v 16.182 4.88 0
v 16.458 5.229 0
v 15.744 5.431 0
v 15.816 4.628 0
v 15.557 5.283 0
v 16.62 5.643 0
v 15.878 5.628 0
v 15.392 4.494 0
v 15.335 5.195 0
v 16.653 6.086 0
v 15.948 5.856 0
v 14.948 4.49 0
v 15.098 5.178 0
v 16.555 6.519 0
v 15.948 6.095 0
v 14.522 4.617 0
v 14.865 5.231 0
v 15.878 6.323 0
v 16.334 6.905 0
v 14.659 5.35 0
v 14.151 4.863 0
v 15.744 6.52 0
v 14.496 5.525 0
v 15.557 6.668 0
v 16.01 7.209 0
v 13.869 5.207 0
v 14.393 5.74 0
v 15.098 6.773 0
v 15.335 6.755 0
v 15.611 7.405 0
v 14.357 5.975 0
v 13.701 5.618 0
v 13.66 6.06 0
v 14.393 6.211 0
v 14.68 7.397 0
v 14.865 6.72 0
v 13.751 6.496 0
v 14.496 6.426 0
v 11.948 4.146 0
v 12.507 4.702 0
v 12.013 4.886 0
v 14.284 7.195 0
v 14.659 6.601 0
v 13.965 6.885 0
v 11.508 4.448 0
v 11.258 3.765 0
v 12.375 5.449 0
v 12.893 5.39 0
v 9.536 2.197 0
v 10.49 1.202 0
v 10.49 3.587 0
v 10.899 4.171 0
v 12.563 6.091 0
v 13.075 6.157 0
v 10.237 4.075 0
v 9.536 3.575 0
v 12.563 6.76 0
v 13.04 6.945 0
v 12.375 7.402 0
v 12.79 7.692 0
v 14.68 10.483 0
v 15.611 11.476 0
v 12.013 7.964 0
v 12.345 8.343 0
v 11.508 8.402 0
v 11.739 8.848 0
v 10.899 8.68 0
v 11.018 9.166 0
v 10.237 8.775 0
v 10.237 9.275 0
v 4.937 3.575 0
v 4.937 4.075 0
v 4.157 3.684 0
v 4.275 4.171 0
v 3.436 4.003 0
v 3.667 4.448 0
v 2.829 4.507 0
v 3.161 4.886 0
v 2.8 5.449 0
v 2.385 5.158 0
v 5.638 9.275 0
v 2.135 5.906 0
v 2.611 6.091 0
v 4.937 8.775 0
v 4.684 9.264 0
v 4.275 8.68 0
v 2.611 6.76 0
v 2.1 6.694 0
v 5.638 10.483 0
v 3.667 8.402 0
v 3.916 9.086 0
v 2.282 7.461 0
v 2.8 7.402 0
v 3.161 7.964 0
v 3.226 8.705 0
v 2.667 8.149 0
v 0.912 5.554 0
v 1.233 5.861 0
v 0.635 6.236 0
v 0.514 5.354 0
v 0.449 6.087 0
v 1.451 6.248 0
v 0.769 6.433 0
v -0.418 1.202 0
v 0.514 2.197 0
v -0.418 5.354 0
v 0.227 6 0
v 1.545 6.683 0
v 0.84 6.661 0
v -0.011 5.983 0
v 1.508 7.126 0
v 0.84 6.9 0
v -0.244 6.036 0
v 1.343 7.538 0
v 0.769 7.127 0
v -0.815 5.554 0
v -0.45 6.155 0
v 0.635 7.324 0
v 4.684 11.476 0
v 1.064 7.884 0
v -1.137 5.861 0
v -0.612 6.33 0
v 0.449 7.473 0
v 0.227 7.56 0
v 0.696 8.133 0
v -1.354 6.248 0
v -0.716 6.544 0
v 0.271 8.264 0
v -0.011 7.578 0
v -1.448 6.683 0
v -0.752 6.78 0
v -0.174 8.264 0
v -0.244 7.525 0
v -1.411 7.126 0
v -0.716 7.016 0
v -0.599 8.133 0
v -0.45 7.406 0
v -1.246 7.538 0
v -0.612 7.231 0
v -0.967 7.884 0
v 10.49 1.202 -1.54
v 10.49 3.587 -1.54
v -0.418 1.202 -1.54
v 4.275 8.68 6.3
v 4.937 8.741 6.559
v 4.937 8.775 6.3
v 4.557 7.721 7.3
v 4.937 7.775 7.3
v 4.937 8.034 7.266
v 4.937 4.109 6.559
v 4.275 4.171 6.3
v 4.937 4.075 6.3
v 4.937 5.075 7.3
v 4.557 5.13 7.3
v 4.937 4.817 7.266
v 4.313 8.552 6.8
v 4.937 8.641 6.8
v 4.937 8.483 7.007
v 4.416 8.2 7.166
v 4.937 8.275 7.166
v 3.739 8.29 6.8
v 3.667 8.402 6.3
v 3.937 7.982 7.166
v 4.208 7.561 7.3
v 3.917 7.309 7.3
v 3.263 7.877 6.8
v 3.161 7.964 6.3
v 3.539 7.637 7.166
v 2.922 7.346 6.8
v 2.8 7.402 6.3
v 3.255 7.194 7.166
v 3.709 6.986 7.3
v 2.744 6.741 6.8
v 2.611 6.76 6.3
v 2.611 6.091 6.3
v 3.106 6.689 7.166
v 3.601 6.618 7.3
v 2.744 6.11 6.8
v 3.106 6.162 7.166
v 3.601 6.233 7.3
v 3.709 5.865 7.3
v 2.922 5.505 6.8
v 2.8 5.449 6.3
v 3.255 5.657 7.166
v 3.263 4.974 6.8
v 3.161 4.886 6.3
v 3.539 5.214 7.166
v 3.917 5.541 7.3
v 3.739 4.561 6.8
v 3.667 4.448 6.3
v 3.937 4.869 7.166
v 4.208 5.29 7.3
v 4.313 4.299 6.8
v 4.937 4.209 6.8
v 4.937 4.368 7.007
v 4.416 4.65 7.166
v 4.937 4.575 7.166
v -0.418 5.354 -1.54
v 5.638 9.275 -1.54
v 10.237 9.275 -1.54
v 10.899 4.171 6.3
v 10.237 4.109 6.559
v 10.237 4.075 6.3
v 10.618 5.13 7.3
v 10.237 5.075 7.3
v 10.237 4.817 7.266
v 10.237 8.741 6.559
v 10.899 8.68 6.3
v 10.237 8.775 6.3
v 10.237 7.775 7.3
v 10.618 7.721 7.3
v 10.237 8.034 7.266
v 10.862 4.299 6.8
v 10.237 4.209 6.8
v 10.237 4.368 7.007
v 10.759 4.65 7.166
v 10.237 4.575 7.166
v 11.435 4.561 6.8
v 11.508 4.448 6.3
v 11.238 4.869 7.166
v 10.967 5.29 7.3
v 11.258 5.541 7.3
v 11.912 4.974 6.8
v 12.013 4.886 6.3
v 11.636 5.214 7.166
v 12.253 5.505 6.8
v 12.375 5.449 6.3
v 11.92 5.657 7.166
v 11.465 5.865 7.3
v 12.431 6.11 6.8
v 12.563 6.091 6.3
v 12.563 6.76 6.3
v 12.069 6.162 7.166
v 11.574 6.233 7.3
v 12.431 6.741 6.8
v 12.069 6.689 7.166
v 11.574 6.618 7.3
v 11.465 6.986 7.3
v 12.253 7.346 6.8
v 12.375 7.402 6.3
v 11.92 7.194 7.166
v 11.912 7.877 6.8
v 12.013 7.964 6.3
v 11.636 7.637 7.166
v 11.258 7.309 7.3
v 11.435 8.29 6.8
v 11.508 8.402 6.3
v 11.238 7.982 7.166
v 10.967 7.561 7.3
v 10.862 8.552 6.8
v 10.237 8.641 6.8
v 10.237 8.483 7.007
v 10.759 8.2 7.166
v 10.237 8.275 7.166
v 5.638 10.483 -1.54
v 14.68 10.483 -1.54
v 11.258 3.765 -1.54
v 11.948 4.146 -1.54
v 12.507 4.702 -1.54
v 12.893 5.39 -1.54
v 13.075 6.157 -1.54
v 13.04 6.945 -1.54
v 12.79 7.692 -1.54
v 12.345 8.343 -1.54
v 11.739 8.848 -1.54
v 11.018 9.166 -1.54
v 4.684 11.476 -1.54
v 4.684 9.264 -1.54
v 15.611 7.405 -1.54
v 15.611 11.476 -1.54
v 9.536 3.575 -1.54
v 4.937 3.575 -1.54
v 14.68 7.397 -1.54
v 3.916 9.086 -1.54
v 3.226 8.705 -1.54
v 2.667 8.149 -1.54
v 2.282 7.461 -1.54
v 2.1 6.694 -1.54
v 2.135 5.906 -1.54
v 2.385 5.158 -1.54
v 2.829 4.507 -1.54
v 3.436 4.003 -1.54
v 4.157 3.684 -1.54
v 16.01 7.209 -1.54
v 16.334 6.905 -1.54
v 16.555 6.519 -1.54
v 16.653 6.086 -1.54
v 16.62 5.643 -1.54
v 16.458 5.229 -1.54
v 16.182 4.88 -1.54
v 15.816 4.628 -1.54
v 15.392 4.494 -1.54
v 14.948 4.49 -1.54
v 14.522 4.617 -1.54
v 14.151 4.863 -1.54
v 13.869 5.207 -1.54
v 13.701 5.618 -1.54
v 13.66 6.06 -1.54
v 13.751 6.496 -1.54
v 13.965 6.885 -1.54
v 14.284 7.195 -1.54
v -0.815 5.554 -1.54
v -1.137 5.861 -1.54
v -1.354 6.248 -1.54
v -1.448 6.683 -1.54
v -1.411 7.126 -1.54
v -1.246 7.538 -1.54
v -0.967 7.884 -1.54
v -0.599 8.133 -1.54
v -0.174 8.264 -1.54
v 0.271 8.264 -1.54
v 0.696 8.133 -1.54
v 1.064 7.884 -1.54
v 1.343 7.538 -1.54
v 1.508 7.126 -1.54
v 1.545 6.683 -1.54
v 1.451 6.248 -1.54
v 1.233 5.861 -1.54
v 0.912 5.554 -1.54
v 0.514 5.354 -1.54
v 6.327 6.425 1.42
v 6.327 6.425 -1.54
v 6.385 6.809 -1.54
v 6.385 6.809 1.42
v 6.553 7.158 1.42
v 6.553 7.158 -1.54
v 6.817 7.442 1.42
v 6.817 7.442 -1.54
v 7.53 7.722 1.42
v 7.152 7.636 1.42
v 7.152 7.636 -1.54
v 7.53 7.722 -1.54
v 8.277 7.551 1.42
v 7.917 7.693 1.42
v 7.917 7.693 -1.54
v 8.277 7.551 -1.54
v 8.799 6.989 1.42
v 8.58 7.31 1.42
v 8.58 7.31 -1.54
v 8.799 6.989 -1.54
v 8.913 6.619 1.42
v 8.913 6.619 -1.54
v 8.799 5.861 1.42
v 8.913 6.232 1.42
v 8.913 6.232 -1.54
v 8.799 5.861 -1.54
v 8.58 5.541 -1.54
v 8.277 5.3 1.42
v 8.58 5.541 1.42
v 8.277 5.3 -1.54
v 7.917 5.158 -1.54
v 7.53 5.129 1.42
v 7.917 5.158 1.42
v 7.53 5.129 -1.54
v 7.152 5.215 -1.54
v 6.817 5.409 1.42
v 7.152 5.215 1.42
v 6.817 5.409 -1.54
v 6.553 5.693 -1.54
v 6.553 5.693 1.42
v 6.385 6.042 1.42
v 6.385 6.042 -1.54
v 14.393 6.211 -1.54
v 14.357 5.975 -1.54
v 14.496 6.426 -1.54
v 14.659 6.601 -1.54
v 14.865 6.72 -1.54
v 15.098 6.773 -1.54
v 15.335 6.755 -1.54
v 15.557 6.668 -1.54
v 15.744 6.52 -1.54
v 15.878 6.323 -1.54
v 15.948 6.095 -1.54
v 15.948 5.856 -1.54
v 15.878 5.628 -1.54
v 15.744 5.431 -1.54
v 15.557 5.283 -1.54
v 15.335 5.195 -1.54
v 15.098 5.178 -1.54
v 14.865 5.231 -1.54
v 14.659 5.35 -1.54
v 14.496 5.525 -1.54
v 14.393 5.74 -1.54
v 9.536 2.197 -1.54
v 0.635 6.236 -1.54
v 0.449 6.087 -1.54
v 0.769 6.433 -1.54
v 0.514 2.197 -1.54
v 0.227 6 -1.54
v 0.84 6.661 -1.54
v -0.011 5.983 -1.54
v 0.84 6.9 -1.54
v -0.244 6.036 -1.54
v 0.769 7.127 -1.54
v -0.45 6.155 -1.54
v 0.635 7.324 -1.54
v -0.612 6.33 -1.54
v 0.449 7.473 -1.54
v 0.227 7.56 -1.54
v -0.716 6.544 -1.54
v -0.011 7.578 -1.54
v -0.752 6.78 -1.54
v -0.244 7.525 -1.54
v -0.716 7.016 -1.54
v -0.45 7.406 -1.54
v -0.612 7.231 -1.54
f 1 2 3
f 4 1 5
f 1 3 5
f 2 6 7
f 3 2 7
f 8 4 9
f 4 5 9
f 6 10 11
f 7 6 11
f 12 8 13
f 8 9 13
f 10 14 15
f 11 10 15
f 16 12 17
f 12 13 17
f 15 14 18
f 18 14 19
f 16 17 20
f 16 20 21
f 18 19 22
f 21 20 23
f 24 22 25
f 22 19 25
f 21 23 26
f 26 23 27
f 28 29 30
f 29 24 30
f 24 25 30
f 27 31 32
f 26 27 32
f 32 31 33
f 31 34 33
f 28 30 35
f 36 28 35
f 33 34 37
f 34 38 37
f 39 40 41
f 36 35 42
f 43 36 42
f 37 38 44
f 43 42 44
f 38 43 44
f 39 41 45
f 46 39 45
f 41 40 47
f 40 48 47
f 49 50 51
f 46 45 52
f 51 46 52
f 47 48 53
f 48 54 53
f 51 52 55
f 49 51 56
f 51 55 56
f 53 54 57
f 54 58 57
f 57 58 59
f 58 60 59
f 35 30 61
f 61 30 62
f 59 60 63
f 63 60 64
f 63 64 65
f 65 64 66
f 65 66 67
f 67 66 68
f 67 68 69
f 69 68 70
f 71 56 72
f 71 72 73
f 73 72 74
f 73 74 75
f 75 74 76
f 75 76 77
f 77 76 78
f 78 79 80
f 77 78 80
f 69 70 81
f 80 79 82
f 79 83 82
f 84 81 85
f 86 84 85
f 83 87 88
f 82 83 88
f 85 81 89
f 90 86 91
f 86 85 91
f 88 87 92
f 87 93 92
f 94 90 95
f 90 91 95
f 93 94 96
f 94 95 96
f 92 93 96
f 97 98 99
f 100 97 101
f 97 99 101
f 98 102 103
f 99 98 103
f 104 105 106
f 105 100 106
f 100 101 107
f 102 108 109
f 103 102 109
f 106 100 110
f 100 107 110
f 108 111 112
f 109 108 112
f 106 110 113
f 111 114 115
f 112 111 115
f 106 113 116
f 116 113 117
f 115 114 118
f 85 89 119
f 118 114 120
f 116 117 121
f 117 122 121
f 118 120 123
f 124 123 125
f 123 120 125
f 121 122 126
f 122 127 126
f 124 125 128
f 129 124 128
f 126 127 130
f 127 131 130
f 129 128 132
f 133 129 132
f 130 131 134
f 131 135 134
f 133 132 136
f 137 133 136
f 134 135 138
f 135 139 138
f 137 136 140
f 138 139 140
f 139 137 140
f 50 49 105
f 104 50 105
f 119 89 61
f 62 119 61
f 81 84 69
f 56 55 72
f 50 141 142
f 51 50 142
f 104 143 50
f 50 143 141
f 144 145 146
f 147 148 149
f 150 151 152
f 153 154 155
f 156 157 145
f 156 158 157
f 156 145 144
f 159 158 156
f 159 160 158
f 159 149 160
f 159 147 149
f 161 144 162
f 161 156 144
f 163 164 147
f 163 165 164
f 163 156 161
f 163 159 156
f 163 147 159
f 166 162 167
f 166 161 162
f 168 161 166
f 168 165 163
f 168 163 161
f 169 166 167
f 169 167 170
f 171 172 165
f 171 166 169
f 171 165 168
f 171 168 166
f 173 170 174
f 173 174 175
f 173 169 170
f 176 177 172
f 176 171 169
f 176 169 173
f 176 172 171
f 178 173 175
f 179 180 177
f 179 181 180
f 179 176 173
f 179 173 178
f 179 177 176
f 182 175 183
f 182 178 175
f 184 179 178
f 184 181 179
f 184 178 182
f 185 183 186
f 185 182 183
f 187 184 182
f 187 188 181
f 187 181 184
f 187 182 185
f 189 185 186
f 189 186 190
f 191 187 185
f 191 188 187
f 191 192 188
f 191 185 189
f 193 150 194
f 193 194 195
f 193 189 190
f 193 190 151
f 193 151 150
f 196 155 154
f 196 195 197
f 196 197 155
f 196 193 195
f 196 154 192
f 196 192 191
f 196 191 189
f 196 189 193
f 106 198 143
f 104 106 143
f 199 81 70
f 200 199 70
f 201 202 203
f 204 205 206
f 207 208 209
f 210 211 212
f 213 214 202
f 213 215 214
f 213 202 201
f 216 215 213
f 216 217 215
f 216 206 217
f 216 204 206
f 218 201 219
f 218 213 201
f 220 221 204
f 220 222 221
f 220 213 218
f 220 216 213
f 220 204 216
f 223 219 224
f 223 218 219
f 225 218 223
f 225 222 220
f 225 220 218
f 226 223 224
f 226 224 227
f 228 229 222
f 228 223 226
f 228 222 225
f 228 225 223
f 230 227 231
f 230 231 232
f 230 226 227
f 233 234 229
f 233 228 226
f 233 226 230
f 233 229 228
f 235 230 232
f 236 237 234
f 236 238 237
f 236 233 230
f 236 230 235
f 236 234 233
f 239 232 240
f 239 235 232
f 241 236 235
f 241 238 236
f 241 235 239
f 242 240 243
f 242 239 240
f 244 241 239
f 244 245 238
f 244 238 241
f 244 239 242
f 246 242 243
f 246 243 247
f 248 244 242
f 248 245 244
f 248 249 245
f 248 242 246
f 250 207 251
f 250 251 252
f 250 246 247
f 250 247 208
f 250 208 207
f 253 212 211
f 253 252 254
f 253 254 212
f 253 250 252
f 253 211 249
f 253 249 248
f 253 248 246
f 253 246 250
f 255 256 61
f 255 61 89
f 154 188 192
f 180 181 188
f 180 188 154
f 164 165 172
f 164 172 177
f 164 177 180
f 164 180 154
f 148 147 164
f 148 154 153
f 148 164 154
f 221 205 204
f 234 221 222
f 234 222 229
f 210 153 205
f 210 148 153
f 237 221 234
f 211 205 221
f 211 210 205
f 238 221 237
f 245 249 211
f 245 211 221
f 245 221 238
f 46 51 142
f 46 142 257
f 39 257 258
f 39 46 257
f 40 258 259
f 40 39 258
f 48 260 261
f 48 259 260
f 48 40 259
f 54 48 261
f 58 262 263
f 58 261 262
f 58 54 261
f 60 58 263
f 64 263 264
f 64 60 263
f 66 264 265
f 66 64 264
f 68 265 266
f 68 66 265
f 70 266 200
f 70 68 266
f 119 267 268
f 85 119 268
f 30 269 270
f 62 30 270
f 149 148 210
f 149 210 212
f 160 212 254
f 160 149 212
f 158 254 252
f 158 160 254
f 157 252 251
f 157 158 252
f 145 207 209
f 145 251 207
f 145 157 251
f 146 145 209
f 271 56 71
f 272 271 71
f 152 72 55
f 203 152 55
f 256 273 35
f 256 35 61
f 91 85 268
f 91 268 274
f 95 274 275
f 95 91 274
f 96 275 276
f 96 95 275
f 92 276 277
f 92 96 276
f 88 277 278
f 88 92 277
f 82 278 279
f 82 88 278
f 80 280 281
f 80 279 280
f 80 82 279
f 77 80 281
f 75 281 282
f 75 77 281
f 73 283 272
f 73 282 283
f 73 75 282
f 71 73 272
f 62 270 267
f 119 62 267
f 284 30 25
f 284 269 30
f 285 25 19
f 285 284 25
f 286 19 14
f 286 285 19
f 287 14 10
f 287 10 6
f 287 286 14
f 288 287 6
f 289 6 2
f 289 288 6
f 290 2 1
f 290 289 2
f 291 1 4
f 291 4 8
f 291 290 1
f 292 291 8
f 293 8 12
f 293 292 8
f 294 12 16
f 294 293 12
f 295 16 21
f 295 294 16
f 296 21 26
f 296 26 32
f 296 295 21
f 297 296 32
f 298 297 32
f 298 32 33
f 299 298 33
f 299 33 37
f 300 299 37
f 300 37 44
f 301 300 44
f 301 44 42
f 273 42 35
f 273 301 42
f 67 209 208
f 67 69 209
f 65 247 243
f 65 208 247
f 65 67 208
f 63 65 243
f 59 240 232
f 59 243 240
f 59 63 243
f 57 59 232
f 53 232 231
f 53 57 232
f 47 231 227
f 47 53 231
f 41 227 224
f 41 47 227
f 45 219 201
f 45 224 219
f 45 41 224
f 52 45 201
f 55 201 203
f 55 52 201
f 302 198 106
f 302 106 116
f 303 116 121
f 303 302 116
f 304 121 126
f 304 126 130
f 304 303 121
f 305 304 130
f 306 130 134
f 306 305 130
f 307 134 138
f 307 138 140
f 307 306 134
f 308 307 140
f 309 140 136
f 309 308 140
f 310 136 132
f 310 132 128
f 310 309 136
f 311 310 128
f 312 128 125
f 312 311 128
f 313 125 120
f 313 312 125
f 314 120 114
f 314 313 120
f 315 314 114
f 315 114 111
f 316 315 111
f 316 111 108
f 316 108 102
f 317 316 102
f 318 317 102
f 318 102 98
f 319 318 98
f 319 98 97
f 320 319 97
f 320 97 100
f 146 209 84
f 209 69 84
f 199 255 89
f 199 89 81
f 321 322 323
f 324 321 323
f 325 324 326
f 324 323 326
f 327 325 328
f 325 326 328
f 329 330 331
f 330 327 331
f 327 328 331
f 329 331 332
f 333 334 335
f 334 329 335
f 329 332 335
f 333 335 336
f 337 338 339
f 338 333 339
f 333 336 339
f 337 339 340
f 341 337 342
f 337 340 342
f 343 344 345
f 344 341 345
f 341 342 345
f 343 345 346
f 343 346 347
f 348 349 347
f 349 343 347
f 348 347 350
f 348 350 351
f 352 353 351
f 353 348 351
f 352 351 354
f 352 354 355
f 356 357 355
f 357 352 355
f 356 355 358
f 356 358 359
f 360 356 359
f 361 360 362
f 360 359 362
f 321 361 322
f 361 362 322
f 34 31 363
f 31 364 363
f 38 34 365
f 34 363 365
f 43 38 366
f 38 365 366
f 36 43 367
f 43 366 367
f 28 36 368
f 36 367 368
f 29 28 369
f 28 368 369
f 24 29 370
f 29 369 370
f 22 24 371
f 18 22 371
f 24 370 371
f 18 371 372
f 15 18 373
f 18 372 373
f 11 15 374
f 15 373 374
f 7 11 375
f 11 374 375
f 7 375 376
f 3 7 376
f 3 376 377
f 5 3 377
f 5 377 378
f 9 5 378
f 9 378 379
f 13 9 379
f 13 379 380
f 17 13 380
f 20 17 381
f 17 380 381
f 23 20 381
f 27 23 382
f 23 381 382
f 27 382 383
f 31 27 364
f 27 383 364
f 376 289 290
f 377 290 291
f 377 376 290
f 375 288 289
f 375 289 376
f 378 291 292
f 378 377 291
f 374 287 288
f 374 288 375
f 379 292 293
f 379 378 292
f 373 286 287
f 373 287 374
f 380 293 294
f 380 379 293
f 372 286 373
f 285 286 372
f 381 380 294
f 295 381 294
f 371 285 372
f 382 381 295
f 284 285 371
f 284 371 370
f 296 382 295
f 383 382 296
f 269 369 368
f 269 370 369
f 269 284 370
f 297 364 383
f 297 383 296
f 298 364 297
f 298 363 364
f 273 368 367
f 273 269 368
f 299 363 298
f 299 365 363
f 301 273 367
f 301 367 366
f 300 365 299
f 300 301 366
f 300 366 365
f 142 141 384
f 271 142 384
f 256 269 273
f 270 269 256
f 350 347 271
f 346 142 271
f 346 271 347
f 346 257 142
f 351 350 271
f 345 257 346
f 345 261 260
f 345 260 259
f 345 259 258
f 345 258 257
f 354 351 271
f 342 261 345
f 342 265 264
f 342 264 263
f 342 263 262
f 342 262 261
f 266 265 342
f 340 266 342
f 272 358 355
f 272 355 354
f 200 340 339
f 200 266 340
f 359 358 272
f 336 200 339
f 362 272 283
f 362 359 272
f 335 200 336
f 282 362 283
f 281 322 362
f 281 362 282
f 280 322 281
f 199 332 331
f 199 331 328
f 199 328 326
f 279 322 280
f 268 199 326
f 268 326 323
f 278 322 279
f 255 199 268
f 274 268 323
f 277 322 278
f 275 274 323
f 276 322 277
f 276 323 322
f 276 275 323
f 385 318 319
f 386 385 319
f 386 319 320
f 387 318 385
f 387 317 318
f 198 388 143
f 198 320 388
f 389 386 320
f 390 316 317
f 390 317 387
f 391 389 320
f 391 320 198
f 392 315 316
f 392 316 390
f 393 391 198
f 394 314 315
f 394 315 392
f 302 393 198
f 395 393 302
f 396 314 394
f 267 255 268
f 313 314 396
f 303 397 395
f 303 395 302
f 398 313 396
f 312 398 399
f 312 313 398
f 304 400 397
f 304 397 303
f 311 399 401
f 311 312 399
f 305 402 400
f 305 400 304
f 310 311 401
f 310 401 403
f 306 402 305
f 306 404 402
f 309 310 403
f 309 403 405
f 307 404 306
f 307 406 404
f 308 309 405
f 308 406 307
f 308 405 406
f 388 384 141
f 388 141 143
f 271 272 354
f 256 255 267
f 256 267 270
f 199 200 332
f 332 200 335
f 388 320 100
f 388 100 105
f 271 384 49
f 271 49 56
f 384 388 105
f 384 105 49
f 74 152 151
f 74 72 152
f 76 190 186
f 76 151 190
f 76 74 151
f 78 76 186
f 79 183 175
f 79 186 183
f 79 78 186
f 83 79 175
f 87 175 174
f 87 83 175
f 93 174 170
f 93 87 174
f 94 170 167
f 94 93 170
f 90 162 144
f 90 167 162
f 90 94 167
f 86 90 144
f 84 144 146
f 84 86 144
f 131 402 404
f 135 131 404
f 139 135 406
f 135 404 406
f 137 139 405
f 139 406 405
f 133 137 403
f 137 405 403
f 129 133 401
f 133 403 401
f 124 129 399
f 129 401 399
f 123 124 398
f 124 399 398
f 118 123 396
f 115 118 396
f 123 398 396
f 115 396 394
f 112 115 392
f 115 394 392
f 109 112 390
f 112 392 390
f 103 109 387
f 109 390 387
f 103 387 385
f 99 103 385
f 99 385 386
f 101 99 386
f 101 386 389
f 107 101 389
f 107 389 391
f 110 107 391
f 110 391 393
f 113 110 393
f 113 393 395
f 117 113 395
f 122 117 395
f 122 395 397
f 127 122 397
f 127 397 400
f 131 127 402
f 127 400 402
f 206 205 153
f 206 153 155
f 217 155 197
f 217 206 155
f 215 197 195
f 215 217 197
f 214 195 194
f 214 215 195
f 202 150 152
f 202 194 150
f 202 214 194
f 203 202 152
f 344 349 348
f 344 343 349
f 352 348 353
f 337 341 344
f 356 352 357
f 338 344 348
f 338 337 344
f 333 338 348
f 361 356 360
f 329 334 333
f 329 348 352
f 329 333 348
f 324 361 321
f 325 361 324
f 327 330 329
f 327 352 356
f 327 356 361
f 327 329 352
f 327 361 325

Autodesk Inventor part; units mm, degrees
ref_plane "YZ Plane" through (0, 0, 0) normal (1, 0, 0) x (0, 1, 0)
ref_plane "XZ Plane" through (0, 0, 0) normal (0, 1, 0) x (-1, 0, 0)
ref_plane "XY Plane" through (0, 0, 0) normal (0, 0, 1) x (1, 0, 0)
sketch "Sketch1" plane through (0, 0, 0) normal (0, 0, 1) x (1, 0, 0)
  line L0 (4.9374, 6.4254) -> (10.2374, 6.4254) construction
  line L1 (4.9374, 4.0754) -> (10.2374, 4.0754)
  line L2 (10.2374, 8.7754) -> (4.9374, 8.7754)
  arc A0 (4.9374, 8.7754) -> (4.9374, 4.0754) centre (4.9374, 6.4254) ccw
  arc A1 (10.2374, 4.0754) -> (10.2374, 8.7754) centre (10.2374, 6.4254) ccw
  point P0 (0, 0)
  point P1 (7.5874, 6.4254)
  dimension "d0" = 10
  dimension "d1" = 4.7
extrude "Extrusion1" add sketch "Sketch1" along normal blind 7.3
fillet "Fillet1" radius 1 4 edges at (7.5874, 8.7754, 7.3) (2.5874, 6.4254, 7.3) (7.5874, 4.0754, 7.3) (12.5874, 6.4254, 7.3)
sketch "Sketch2" plane through (0, 0, 0) normal (0, 0, -1) x (-1, 0, 0)
  line L0 (-4.9374, 4.0754) -> (-10.2374, 4.0754) projected
  arc A0 (-4.9374, 4.0754) -> (-4.9374, 8.7754) centre (-4.9374, 6.4254) ccw projected
  line L1 (-10.2374, 8.7754) -> (-4.9374, 8.7754) projected
  arc A1 (-10.2374, 8.7754) -> (-10.2374, 4.0754) centre (-10.2374, 6.4254) ccw projected
  line L2 (-10.2374, 6.4254) -> (-4.9374, 6.4254) construction
  line L3 (-10.2374, 3.5754) -> (-4.9374, 3.5754)
  line L4 (-4.9374, 9.2754) -> (-10.2374, 9.2754)
  arc A2 (-10.2374, 9.2754) -> (-10.2374, 3.5754) centre (-10.2374, 6.4254) ccw
  arc A3 (-4.9374, 3.5754) -> (-4.9374, 9.2754) centre (-4.9374, 6.4254) ccw
  point P0 (0, 0)
  point P1 (-7.5874, 6.4254)
  dimension "d5" = 0.5
extrude "Extrusion2" add sketch "Sketch2" along normal blind 1.54
sketch "Sketch3" plane through (0, 0, 0) normal (0, 0, -1) x (-1, 0, 0)
  line L0 (-4.9374, 4.0754) -> (-10.2374, 4.0754) projected
  arc A0 (-4.9374, 4.0754) -> (-4.9374, 8.7754) centre (-4.9374, 6.4254) ccw projected
  line L1 (-10.2374, 8.7754) -> (-4.9374, 8.7754) projected
  arc A1 (-10.2374, 8.7754) -> (-10.2374, 4.0754) centre (-10.2374, 6.4254) ccw projected
  line L2 (-10.2374, 6.4254) -> (-4.9374, 6.4254) construction
  line L3 (-10.2374, 3.6254) -> (-4.9374, 3.6254)
  line L4 (-4.9374, 9.2254) -> (-10.2374, 9.2254)
  arc A2 (-10.2374, 9.2254) -> (-10.2374, 3.6254) centre (-10.2374, 6.4254) ccw
  arc A3 (-4.9374, 3.6254) -> (-4.9374, 9.2254) centre (-4.9374, 6.4254) ccw
  point P0 (0, 0)
  point P1 (-7.5874, 6.4254)
extrude "Extrusion3" add sketch "Sketch3" along normal blind 1.54 contours L0 A1 L1 A0
sketch "Sketch4" plane through (0, 0, -1.54) normal (0, 0, -1) x (-1, 0, 0)
  line L0 (-4.9374, 9.2754) -> (-10.2374, 9.2754) projected
  arc A0 (-10.2374, 9.2754) -> (-10.2374, 3.5754) centre (-10.2374, 6.4254) ccw projected
  line L1 (-10.2374, 6.4254) -> (-7.6274, 6.4254)
  circle A1 centre (-7.6274, 6.4254) radius 1.3
  point P0 (0, 0)
  dimension "d10" = 2.61
  dimension "d11" = 2.6
extrude "Extrusion4" cut sketch "Sketch4" against normal blind 2.96
sketch "Sketch5" plane through (0, 0, -1.54) normal (0, 0, -1) x (-1, 0, 0)
  arc A0 (-4.9374, 3.5754) -> (-4.9374, 9.2754) centre (-4.9374, 6.4254) ccw projected
  line L0 (-4.9374, 9.2754) -> (-10.2374, 9.2754) projected
  circle A1 centre (-15.1574, 5.9754) radius 0.8
  arc A2 (-15.6111, 7.4051) -> (-14.6795, 7.3972) centre (-15.1574, 5.9754) ccw
  line L1 (-15.6111, 8.031) -> (-15.6271, 8.031)
  line L2 (-15.6111, 7.4051) -> (-15.6111, 10.4765)
  line L3 (-4.6841, 10.5736) -> (-4.6841, 9.2641)
  line L4 (-14.6795, 7.3972) -> (-14.6795, 9.4832)
  line L5 (-5.6379, 9.578) -> (-5.6379, 9.2754)
  line L6 (-10.2374, 3.5754) -> (-4.9374, 3.5754) projected
  line L7 (-15.6111, 10.4765) -> (-15.6111, 11.4765)
  line L8 (-15.6111, 11.4765) -> (-4.6841, 11.4765)
  line L9 (-4.6841, 11.4765) -> (-4.6841, 10.2108)
  line L10 (-14.6795, 9.4832) -> (-14.6795, 10.4832)
  line L11 (-14.6795, 10.4832) -> (-5.6379, 10.4832)
  line L12 (-5.6379, 10.4832) -> (-5.6379, 9.578)
  point P0 (0, 0)
  dimension "d15" = 1.6
  dimension "d34" = 1
  dimension "d39" = 0.7
extrude "Extrusion5" add sketch "Sketch5" against normal blind 1.54
sketch "Sketch6" plane through (0, 0, -1.54) normal (0, 0, -1) x (-1, 0, 0)
  line L0 (-10.2374, 3.5754) -> (-4.9374, 3.5754) projected
  arc A0 (-10.2374, 9.2754) -> (-10.2374, 3.5754) centre (-10.2374, 6.4254) ccw projected
  circle A1 centre (-0.0485, 6.7803) radius 0.8
  arc A2 (0.4175, 5.3545) -> (-0.5144, 5.3545) centre (-0.0485, 6.7803) ccw
  line L1 (0.4175, 5.3545) -> (0.4175, 2.2034)
  line L2 (-0.5144, 3.7394) -> (-0.5144, 5.3545)
  line L3 (-0.5144, 3.7394) -> (-0.5144, 3.1974)
  line L4 (-10.4904, 2.2016) -> (-10.4904, 3.5866)
  line L5 (-9.5364, 3.1974) -> (-9.5364, 3.5754)
  line L6 (-5.6379, 10.4832) -> (-5.6379, 9.2754) projected
  line L7 (0.4175, 2.2034) -> (0.4175, 1.2016)
  line L8 (0.4175, 1.2016) -> (-10.4904, 1.2016)
  line L9 (-10.4904, 1.2016) -> (-10.4904, 2.2016)
  line L10 (-0.5144, 3.1974) -> (-0.5144, 2.1974)
  line L11 (-0.5144, 2.1974) -> (-9.5364, 2.1974)
  line L12 (-9.5364, 2.1974) -> (-9.5364, 3.1974)
  point P0 (0, 0)
  point P1 (-1.5346, 6.984)
  dimension "d22" = 1.6
  dimension "d37" = 1
  dimension "d40" = 0.7
extrude "Extrusion6" add sketch "Sketch6" against normal blind 1.54
properties part number "button"
